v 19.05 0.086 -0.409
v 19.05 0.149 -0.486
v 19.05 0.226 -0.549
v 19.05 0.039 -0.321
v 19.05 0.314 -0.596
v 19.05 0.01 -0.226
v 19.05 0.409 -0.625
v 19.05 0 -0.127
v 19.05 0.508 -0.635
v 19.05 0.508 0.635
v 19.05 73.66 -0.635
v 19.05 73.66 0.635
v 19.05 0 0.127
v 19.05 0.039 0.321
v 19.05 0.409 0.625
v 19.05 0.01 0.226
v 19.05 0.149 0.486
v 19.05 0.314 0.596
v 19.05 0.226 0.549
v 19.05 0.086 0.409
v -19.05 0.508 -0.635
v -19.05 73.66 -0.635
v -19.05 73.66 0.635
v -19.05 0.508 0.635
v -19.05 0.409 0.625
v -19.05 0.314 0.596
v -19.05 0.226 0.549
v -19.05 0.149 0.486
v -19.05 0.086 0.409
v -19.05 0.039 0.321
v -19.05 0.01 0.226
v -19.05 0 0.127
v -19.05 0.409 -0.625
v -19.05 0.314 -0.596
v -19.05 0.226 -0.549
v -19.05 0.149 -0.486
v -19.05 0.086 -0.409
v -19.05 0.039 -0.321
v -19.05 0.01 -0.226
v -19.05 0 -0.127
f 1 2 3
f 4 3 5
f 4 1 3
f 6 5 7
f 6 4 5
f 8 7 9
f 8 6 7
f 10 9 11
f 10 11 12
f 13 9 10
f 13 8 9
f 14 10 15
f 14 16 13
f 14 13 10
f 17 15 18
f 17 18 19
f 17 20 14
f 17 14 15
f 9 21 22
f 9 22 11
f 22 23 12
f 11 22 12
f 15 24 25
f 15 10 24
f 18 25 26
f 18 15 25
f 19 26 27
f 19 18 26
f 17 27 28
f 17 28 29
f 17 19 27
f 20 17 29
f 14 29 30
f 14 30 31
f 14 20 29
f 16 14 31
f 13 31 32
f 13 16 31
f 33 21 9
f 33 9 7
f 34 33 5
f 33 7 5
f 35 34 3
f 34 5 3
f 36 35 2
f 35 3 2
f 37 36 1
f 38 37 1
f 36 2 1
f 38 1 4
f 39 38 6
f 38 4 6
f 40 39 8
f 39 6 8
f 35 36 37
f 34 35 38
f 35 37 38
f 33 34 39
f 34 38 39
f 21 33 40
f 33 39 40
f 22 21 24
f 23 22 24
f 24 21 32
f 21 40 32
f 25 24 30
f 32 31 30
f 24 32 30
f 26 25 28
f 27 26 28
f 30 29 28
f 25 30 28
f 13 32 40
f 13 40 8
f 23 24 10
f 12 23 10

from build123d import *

# Parameters (mm, degrees)
F0_W     = 38.1
F0_H     = 1.27
F1_DEPTH = 73.66
F2_R     = 0.508


with BuildPart() as f1:
    # F0 (on Front) → F1 (new body)
    with BuildSketch(Plane.XZ):
        Rectangle(F0_W, F0_H)
    extrude(amount=-F1_DEPTH)

    # F2
    f2_edges = [f1.edges().sort_by_distance(p)[0] for p in [
        (0, 0, 0.635),
        (0, 0, -0.635),
    ]]
    fillet(f2_edges, radius=F2_R)


solid = f1.part
